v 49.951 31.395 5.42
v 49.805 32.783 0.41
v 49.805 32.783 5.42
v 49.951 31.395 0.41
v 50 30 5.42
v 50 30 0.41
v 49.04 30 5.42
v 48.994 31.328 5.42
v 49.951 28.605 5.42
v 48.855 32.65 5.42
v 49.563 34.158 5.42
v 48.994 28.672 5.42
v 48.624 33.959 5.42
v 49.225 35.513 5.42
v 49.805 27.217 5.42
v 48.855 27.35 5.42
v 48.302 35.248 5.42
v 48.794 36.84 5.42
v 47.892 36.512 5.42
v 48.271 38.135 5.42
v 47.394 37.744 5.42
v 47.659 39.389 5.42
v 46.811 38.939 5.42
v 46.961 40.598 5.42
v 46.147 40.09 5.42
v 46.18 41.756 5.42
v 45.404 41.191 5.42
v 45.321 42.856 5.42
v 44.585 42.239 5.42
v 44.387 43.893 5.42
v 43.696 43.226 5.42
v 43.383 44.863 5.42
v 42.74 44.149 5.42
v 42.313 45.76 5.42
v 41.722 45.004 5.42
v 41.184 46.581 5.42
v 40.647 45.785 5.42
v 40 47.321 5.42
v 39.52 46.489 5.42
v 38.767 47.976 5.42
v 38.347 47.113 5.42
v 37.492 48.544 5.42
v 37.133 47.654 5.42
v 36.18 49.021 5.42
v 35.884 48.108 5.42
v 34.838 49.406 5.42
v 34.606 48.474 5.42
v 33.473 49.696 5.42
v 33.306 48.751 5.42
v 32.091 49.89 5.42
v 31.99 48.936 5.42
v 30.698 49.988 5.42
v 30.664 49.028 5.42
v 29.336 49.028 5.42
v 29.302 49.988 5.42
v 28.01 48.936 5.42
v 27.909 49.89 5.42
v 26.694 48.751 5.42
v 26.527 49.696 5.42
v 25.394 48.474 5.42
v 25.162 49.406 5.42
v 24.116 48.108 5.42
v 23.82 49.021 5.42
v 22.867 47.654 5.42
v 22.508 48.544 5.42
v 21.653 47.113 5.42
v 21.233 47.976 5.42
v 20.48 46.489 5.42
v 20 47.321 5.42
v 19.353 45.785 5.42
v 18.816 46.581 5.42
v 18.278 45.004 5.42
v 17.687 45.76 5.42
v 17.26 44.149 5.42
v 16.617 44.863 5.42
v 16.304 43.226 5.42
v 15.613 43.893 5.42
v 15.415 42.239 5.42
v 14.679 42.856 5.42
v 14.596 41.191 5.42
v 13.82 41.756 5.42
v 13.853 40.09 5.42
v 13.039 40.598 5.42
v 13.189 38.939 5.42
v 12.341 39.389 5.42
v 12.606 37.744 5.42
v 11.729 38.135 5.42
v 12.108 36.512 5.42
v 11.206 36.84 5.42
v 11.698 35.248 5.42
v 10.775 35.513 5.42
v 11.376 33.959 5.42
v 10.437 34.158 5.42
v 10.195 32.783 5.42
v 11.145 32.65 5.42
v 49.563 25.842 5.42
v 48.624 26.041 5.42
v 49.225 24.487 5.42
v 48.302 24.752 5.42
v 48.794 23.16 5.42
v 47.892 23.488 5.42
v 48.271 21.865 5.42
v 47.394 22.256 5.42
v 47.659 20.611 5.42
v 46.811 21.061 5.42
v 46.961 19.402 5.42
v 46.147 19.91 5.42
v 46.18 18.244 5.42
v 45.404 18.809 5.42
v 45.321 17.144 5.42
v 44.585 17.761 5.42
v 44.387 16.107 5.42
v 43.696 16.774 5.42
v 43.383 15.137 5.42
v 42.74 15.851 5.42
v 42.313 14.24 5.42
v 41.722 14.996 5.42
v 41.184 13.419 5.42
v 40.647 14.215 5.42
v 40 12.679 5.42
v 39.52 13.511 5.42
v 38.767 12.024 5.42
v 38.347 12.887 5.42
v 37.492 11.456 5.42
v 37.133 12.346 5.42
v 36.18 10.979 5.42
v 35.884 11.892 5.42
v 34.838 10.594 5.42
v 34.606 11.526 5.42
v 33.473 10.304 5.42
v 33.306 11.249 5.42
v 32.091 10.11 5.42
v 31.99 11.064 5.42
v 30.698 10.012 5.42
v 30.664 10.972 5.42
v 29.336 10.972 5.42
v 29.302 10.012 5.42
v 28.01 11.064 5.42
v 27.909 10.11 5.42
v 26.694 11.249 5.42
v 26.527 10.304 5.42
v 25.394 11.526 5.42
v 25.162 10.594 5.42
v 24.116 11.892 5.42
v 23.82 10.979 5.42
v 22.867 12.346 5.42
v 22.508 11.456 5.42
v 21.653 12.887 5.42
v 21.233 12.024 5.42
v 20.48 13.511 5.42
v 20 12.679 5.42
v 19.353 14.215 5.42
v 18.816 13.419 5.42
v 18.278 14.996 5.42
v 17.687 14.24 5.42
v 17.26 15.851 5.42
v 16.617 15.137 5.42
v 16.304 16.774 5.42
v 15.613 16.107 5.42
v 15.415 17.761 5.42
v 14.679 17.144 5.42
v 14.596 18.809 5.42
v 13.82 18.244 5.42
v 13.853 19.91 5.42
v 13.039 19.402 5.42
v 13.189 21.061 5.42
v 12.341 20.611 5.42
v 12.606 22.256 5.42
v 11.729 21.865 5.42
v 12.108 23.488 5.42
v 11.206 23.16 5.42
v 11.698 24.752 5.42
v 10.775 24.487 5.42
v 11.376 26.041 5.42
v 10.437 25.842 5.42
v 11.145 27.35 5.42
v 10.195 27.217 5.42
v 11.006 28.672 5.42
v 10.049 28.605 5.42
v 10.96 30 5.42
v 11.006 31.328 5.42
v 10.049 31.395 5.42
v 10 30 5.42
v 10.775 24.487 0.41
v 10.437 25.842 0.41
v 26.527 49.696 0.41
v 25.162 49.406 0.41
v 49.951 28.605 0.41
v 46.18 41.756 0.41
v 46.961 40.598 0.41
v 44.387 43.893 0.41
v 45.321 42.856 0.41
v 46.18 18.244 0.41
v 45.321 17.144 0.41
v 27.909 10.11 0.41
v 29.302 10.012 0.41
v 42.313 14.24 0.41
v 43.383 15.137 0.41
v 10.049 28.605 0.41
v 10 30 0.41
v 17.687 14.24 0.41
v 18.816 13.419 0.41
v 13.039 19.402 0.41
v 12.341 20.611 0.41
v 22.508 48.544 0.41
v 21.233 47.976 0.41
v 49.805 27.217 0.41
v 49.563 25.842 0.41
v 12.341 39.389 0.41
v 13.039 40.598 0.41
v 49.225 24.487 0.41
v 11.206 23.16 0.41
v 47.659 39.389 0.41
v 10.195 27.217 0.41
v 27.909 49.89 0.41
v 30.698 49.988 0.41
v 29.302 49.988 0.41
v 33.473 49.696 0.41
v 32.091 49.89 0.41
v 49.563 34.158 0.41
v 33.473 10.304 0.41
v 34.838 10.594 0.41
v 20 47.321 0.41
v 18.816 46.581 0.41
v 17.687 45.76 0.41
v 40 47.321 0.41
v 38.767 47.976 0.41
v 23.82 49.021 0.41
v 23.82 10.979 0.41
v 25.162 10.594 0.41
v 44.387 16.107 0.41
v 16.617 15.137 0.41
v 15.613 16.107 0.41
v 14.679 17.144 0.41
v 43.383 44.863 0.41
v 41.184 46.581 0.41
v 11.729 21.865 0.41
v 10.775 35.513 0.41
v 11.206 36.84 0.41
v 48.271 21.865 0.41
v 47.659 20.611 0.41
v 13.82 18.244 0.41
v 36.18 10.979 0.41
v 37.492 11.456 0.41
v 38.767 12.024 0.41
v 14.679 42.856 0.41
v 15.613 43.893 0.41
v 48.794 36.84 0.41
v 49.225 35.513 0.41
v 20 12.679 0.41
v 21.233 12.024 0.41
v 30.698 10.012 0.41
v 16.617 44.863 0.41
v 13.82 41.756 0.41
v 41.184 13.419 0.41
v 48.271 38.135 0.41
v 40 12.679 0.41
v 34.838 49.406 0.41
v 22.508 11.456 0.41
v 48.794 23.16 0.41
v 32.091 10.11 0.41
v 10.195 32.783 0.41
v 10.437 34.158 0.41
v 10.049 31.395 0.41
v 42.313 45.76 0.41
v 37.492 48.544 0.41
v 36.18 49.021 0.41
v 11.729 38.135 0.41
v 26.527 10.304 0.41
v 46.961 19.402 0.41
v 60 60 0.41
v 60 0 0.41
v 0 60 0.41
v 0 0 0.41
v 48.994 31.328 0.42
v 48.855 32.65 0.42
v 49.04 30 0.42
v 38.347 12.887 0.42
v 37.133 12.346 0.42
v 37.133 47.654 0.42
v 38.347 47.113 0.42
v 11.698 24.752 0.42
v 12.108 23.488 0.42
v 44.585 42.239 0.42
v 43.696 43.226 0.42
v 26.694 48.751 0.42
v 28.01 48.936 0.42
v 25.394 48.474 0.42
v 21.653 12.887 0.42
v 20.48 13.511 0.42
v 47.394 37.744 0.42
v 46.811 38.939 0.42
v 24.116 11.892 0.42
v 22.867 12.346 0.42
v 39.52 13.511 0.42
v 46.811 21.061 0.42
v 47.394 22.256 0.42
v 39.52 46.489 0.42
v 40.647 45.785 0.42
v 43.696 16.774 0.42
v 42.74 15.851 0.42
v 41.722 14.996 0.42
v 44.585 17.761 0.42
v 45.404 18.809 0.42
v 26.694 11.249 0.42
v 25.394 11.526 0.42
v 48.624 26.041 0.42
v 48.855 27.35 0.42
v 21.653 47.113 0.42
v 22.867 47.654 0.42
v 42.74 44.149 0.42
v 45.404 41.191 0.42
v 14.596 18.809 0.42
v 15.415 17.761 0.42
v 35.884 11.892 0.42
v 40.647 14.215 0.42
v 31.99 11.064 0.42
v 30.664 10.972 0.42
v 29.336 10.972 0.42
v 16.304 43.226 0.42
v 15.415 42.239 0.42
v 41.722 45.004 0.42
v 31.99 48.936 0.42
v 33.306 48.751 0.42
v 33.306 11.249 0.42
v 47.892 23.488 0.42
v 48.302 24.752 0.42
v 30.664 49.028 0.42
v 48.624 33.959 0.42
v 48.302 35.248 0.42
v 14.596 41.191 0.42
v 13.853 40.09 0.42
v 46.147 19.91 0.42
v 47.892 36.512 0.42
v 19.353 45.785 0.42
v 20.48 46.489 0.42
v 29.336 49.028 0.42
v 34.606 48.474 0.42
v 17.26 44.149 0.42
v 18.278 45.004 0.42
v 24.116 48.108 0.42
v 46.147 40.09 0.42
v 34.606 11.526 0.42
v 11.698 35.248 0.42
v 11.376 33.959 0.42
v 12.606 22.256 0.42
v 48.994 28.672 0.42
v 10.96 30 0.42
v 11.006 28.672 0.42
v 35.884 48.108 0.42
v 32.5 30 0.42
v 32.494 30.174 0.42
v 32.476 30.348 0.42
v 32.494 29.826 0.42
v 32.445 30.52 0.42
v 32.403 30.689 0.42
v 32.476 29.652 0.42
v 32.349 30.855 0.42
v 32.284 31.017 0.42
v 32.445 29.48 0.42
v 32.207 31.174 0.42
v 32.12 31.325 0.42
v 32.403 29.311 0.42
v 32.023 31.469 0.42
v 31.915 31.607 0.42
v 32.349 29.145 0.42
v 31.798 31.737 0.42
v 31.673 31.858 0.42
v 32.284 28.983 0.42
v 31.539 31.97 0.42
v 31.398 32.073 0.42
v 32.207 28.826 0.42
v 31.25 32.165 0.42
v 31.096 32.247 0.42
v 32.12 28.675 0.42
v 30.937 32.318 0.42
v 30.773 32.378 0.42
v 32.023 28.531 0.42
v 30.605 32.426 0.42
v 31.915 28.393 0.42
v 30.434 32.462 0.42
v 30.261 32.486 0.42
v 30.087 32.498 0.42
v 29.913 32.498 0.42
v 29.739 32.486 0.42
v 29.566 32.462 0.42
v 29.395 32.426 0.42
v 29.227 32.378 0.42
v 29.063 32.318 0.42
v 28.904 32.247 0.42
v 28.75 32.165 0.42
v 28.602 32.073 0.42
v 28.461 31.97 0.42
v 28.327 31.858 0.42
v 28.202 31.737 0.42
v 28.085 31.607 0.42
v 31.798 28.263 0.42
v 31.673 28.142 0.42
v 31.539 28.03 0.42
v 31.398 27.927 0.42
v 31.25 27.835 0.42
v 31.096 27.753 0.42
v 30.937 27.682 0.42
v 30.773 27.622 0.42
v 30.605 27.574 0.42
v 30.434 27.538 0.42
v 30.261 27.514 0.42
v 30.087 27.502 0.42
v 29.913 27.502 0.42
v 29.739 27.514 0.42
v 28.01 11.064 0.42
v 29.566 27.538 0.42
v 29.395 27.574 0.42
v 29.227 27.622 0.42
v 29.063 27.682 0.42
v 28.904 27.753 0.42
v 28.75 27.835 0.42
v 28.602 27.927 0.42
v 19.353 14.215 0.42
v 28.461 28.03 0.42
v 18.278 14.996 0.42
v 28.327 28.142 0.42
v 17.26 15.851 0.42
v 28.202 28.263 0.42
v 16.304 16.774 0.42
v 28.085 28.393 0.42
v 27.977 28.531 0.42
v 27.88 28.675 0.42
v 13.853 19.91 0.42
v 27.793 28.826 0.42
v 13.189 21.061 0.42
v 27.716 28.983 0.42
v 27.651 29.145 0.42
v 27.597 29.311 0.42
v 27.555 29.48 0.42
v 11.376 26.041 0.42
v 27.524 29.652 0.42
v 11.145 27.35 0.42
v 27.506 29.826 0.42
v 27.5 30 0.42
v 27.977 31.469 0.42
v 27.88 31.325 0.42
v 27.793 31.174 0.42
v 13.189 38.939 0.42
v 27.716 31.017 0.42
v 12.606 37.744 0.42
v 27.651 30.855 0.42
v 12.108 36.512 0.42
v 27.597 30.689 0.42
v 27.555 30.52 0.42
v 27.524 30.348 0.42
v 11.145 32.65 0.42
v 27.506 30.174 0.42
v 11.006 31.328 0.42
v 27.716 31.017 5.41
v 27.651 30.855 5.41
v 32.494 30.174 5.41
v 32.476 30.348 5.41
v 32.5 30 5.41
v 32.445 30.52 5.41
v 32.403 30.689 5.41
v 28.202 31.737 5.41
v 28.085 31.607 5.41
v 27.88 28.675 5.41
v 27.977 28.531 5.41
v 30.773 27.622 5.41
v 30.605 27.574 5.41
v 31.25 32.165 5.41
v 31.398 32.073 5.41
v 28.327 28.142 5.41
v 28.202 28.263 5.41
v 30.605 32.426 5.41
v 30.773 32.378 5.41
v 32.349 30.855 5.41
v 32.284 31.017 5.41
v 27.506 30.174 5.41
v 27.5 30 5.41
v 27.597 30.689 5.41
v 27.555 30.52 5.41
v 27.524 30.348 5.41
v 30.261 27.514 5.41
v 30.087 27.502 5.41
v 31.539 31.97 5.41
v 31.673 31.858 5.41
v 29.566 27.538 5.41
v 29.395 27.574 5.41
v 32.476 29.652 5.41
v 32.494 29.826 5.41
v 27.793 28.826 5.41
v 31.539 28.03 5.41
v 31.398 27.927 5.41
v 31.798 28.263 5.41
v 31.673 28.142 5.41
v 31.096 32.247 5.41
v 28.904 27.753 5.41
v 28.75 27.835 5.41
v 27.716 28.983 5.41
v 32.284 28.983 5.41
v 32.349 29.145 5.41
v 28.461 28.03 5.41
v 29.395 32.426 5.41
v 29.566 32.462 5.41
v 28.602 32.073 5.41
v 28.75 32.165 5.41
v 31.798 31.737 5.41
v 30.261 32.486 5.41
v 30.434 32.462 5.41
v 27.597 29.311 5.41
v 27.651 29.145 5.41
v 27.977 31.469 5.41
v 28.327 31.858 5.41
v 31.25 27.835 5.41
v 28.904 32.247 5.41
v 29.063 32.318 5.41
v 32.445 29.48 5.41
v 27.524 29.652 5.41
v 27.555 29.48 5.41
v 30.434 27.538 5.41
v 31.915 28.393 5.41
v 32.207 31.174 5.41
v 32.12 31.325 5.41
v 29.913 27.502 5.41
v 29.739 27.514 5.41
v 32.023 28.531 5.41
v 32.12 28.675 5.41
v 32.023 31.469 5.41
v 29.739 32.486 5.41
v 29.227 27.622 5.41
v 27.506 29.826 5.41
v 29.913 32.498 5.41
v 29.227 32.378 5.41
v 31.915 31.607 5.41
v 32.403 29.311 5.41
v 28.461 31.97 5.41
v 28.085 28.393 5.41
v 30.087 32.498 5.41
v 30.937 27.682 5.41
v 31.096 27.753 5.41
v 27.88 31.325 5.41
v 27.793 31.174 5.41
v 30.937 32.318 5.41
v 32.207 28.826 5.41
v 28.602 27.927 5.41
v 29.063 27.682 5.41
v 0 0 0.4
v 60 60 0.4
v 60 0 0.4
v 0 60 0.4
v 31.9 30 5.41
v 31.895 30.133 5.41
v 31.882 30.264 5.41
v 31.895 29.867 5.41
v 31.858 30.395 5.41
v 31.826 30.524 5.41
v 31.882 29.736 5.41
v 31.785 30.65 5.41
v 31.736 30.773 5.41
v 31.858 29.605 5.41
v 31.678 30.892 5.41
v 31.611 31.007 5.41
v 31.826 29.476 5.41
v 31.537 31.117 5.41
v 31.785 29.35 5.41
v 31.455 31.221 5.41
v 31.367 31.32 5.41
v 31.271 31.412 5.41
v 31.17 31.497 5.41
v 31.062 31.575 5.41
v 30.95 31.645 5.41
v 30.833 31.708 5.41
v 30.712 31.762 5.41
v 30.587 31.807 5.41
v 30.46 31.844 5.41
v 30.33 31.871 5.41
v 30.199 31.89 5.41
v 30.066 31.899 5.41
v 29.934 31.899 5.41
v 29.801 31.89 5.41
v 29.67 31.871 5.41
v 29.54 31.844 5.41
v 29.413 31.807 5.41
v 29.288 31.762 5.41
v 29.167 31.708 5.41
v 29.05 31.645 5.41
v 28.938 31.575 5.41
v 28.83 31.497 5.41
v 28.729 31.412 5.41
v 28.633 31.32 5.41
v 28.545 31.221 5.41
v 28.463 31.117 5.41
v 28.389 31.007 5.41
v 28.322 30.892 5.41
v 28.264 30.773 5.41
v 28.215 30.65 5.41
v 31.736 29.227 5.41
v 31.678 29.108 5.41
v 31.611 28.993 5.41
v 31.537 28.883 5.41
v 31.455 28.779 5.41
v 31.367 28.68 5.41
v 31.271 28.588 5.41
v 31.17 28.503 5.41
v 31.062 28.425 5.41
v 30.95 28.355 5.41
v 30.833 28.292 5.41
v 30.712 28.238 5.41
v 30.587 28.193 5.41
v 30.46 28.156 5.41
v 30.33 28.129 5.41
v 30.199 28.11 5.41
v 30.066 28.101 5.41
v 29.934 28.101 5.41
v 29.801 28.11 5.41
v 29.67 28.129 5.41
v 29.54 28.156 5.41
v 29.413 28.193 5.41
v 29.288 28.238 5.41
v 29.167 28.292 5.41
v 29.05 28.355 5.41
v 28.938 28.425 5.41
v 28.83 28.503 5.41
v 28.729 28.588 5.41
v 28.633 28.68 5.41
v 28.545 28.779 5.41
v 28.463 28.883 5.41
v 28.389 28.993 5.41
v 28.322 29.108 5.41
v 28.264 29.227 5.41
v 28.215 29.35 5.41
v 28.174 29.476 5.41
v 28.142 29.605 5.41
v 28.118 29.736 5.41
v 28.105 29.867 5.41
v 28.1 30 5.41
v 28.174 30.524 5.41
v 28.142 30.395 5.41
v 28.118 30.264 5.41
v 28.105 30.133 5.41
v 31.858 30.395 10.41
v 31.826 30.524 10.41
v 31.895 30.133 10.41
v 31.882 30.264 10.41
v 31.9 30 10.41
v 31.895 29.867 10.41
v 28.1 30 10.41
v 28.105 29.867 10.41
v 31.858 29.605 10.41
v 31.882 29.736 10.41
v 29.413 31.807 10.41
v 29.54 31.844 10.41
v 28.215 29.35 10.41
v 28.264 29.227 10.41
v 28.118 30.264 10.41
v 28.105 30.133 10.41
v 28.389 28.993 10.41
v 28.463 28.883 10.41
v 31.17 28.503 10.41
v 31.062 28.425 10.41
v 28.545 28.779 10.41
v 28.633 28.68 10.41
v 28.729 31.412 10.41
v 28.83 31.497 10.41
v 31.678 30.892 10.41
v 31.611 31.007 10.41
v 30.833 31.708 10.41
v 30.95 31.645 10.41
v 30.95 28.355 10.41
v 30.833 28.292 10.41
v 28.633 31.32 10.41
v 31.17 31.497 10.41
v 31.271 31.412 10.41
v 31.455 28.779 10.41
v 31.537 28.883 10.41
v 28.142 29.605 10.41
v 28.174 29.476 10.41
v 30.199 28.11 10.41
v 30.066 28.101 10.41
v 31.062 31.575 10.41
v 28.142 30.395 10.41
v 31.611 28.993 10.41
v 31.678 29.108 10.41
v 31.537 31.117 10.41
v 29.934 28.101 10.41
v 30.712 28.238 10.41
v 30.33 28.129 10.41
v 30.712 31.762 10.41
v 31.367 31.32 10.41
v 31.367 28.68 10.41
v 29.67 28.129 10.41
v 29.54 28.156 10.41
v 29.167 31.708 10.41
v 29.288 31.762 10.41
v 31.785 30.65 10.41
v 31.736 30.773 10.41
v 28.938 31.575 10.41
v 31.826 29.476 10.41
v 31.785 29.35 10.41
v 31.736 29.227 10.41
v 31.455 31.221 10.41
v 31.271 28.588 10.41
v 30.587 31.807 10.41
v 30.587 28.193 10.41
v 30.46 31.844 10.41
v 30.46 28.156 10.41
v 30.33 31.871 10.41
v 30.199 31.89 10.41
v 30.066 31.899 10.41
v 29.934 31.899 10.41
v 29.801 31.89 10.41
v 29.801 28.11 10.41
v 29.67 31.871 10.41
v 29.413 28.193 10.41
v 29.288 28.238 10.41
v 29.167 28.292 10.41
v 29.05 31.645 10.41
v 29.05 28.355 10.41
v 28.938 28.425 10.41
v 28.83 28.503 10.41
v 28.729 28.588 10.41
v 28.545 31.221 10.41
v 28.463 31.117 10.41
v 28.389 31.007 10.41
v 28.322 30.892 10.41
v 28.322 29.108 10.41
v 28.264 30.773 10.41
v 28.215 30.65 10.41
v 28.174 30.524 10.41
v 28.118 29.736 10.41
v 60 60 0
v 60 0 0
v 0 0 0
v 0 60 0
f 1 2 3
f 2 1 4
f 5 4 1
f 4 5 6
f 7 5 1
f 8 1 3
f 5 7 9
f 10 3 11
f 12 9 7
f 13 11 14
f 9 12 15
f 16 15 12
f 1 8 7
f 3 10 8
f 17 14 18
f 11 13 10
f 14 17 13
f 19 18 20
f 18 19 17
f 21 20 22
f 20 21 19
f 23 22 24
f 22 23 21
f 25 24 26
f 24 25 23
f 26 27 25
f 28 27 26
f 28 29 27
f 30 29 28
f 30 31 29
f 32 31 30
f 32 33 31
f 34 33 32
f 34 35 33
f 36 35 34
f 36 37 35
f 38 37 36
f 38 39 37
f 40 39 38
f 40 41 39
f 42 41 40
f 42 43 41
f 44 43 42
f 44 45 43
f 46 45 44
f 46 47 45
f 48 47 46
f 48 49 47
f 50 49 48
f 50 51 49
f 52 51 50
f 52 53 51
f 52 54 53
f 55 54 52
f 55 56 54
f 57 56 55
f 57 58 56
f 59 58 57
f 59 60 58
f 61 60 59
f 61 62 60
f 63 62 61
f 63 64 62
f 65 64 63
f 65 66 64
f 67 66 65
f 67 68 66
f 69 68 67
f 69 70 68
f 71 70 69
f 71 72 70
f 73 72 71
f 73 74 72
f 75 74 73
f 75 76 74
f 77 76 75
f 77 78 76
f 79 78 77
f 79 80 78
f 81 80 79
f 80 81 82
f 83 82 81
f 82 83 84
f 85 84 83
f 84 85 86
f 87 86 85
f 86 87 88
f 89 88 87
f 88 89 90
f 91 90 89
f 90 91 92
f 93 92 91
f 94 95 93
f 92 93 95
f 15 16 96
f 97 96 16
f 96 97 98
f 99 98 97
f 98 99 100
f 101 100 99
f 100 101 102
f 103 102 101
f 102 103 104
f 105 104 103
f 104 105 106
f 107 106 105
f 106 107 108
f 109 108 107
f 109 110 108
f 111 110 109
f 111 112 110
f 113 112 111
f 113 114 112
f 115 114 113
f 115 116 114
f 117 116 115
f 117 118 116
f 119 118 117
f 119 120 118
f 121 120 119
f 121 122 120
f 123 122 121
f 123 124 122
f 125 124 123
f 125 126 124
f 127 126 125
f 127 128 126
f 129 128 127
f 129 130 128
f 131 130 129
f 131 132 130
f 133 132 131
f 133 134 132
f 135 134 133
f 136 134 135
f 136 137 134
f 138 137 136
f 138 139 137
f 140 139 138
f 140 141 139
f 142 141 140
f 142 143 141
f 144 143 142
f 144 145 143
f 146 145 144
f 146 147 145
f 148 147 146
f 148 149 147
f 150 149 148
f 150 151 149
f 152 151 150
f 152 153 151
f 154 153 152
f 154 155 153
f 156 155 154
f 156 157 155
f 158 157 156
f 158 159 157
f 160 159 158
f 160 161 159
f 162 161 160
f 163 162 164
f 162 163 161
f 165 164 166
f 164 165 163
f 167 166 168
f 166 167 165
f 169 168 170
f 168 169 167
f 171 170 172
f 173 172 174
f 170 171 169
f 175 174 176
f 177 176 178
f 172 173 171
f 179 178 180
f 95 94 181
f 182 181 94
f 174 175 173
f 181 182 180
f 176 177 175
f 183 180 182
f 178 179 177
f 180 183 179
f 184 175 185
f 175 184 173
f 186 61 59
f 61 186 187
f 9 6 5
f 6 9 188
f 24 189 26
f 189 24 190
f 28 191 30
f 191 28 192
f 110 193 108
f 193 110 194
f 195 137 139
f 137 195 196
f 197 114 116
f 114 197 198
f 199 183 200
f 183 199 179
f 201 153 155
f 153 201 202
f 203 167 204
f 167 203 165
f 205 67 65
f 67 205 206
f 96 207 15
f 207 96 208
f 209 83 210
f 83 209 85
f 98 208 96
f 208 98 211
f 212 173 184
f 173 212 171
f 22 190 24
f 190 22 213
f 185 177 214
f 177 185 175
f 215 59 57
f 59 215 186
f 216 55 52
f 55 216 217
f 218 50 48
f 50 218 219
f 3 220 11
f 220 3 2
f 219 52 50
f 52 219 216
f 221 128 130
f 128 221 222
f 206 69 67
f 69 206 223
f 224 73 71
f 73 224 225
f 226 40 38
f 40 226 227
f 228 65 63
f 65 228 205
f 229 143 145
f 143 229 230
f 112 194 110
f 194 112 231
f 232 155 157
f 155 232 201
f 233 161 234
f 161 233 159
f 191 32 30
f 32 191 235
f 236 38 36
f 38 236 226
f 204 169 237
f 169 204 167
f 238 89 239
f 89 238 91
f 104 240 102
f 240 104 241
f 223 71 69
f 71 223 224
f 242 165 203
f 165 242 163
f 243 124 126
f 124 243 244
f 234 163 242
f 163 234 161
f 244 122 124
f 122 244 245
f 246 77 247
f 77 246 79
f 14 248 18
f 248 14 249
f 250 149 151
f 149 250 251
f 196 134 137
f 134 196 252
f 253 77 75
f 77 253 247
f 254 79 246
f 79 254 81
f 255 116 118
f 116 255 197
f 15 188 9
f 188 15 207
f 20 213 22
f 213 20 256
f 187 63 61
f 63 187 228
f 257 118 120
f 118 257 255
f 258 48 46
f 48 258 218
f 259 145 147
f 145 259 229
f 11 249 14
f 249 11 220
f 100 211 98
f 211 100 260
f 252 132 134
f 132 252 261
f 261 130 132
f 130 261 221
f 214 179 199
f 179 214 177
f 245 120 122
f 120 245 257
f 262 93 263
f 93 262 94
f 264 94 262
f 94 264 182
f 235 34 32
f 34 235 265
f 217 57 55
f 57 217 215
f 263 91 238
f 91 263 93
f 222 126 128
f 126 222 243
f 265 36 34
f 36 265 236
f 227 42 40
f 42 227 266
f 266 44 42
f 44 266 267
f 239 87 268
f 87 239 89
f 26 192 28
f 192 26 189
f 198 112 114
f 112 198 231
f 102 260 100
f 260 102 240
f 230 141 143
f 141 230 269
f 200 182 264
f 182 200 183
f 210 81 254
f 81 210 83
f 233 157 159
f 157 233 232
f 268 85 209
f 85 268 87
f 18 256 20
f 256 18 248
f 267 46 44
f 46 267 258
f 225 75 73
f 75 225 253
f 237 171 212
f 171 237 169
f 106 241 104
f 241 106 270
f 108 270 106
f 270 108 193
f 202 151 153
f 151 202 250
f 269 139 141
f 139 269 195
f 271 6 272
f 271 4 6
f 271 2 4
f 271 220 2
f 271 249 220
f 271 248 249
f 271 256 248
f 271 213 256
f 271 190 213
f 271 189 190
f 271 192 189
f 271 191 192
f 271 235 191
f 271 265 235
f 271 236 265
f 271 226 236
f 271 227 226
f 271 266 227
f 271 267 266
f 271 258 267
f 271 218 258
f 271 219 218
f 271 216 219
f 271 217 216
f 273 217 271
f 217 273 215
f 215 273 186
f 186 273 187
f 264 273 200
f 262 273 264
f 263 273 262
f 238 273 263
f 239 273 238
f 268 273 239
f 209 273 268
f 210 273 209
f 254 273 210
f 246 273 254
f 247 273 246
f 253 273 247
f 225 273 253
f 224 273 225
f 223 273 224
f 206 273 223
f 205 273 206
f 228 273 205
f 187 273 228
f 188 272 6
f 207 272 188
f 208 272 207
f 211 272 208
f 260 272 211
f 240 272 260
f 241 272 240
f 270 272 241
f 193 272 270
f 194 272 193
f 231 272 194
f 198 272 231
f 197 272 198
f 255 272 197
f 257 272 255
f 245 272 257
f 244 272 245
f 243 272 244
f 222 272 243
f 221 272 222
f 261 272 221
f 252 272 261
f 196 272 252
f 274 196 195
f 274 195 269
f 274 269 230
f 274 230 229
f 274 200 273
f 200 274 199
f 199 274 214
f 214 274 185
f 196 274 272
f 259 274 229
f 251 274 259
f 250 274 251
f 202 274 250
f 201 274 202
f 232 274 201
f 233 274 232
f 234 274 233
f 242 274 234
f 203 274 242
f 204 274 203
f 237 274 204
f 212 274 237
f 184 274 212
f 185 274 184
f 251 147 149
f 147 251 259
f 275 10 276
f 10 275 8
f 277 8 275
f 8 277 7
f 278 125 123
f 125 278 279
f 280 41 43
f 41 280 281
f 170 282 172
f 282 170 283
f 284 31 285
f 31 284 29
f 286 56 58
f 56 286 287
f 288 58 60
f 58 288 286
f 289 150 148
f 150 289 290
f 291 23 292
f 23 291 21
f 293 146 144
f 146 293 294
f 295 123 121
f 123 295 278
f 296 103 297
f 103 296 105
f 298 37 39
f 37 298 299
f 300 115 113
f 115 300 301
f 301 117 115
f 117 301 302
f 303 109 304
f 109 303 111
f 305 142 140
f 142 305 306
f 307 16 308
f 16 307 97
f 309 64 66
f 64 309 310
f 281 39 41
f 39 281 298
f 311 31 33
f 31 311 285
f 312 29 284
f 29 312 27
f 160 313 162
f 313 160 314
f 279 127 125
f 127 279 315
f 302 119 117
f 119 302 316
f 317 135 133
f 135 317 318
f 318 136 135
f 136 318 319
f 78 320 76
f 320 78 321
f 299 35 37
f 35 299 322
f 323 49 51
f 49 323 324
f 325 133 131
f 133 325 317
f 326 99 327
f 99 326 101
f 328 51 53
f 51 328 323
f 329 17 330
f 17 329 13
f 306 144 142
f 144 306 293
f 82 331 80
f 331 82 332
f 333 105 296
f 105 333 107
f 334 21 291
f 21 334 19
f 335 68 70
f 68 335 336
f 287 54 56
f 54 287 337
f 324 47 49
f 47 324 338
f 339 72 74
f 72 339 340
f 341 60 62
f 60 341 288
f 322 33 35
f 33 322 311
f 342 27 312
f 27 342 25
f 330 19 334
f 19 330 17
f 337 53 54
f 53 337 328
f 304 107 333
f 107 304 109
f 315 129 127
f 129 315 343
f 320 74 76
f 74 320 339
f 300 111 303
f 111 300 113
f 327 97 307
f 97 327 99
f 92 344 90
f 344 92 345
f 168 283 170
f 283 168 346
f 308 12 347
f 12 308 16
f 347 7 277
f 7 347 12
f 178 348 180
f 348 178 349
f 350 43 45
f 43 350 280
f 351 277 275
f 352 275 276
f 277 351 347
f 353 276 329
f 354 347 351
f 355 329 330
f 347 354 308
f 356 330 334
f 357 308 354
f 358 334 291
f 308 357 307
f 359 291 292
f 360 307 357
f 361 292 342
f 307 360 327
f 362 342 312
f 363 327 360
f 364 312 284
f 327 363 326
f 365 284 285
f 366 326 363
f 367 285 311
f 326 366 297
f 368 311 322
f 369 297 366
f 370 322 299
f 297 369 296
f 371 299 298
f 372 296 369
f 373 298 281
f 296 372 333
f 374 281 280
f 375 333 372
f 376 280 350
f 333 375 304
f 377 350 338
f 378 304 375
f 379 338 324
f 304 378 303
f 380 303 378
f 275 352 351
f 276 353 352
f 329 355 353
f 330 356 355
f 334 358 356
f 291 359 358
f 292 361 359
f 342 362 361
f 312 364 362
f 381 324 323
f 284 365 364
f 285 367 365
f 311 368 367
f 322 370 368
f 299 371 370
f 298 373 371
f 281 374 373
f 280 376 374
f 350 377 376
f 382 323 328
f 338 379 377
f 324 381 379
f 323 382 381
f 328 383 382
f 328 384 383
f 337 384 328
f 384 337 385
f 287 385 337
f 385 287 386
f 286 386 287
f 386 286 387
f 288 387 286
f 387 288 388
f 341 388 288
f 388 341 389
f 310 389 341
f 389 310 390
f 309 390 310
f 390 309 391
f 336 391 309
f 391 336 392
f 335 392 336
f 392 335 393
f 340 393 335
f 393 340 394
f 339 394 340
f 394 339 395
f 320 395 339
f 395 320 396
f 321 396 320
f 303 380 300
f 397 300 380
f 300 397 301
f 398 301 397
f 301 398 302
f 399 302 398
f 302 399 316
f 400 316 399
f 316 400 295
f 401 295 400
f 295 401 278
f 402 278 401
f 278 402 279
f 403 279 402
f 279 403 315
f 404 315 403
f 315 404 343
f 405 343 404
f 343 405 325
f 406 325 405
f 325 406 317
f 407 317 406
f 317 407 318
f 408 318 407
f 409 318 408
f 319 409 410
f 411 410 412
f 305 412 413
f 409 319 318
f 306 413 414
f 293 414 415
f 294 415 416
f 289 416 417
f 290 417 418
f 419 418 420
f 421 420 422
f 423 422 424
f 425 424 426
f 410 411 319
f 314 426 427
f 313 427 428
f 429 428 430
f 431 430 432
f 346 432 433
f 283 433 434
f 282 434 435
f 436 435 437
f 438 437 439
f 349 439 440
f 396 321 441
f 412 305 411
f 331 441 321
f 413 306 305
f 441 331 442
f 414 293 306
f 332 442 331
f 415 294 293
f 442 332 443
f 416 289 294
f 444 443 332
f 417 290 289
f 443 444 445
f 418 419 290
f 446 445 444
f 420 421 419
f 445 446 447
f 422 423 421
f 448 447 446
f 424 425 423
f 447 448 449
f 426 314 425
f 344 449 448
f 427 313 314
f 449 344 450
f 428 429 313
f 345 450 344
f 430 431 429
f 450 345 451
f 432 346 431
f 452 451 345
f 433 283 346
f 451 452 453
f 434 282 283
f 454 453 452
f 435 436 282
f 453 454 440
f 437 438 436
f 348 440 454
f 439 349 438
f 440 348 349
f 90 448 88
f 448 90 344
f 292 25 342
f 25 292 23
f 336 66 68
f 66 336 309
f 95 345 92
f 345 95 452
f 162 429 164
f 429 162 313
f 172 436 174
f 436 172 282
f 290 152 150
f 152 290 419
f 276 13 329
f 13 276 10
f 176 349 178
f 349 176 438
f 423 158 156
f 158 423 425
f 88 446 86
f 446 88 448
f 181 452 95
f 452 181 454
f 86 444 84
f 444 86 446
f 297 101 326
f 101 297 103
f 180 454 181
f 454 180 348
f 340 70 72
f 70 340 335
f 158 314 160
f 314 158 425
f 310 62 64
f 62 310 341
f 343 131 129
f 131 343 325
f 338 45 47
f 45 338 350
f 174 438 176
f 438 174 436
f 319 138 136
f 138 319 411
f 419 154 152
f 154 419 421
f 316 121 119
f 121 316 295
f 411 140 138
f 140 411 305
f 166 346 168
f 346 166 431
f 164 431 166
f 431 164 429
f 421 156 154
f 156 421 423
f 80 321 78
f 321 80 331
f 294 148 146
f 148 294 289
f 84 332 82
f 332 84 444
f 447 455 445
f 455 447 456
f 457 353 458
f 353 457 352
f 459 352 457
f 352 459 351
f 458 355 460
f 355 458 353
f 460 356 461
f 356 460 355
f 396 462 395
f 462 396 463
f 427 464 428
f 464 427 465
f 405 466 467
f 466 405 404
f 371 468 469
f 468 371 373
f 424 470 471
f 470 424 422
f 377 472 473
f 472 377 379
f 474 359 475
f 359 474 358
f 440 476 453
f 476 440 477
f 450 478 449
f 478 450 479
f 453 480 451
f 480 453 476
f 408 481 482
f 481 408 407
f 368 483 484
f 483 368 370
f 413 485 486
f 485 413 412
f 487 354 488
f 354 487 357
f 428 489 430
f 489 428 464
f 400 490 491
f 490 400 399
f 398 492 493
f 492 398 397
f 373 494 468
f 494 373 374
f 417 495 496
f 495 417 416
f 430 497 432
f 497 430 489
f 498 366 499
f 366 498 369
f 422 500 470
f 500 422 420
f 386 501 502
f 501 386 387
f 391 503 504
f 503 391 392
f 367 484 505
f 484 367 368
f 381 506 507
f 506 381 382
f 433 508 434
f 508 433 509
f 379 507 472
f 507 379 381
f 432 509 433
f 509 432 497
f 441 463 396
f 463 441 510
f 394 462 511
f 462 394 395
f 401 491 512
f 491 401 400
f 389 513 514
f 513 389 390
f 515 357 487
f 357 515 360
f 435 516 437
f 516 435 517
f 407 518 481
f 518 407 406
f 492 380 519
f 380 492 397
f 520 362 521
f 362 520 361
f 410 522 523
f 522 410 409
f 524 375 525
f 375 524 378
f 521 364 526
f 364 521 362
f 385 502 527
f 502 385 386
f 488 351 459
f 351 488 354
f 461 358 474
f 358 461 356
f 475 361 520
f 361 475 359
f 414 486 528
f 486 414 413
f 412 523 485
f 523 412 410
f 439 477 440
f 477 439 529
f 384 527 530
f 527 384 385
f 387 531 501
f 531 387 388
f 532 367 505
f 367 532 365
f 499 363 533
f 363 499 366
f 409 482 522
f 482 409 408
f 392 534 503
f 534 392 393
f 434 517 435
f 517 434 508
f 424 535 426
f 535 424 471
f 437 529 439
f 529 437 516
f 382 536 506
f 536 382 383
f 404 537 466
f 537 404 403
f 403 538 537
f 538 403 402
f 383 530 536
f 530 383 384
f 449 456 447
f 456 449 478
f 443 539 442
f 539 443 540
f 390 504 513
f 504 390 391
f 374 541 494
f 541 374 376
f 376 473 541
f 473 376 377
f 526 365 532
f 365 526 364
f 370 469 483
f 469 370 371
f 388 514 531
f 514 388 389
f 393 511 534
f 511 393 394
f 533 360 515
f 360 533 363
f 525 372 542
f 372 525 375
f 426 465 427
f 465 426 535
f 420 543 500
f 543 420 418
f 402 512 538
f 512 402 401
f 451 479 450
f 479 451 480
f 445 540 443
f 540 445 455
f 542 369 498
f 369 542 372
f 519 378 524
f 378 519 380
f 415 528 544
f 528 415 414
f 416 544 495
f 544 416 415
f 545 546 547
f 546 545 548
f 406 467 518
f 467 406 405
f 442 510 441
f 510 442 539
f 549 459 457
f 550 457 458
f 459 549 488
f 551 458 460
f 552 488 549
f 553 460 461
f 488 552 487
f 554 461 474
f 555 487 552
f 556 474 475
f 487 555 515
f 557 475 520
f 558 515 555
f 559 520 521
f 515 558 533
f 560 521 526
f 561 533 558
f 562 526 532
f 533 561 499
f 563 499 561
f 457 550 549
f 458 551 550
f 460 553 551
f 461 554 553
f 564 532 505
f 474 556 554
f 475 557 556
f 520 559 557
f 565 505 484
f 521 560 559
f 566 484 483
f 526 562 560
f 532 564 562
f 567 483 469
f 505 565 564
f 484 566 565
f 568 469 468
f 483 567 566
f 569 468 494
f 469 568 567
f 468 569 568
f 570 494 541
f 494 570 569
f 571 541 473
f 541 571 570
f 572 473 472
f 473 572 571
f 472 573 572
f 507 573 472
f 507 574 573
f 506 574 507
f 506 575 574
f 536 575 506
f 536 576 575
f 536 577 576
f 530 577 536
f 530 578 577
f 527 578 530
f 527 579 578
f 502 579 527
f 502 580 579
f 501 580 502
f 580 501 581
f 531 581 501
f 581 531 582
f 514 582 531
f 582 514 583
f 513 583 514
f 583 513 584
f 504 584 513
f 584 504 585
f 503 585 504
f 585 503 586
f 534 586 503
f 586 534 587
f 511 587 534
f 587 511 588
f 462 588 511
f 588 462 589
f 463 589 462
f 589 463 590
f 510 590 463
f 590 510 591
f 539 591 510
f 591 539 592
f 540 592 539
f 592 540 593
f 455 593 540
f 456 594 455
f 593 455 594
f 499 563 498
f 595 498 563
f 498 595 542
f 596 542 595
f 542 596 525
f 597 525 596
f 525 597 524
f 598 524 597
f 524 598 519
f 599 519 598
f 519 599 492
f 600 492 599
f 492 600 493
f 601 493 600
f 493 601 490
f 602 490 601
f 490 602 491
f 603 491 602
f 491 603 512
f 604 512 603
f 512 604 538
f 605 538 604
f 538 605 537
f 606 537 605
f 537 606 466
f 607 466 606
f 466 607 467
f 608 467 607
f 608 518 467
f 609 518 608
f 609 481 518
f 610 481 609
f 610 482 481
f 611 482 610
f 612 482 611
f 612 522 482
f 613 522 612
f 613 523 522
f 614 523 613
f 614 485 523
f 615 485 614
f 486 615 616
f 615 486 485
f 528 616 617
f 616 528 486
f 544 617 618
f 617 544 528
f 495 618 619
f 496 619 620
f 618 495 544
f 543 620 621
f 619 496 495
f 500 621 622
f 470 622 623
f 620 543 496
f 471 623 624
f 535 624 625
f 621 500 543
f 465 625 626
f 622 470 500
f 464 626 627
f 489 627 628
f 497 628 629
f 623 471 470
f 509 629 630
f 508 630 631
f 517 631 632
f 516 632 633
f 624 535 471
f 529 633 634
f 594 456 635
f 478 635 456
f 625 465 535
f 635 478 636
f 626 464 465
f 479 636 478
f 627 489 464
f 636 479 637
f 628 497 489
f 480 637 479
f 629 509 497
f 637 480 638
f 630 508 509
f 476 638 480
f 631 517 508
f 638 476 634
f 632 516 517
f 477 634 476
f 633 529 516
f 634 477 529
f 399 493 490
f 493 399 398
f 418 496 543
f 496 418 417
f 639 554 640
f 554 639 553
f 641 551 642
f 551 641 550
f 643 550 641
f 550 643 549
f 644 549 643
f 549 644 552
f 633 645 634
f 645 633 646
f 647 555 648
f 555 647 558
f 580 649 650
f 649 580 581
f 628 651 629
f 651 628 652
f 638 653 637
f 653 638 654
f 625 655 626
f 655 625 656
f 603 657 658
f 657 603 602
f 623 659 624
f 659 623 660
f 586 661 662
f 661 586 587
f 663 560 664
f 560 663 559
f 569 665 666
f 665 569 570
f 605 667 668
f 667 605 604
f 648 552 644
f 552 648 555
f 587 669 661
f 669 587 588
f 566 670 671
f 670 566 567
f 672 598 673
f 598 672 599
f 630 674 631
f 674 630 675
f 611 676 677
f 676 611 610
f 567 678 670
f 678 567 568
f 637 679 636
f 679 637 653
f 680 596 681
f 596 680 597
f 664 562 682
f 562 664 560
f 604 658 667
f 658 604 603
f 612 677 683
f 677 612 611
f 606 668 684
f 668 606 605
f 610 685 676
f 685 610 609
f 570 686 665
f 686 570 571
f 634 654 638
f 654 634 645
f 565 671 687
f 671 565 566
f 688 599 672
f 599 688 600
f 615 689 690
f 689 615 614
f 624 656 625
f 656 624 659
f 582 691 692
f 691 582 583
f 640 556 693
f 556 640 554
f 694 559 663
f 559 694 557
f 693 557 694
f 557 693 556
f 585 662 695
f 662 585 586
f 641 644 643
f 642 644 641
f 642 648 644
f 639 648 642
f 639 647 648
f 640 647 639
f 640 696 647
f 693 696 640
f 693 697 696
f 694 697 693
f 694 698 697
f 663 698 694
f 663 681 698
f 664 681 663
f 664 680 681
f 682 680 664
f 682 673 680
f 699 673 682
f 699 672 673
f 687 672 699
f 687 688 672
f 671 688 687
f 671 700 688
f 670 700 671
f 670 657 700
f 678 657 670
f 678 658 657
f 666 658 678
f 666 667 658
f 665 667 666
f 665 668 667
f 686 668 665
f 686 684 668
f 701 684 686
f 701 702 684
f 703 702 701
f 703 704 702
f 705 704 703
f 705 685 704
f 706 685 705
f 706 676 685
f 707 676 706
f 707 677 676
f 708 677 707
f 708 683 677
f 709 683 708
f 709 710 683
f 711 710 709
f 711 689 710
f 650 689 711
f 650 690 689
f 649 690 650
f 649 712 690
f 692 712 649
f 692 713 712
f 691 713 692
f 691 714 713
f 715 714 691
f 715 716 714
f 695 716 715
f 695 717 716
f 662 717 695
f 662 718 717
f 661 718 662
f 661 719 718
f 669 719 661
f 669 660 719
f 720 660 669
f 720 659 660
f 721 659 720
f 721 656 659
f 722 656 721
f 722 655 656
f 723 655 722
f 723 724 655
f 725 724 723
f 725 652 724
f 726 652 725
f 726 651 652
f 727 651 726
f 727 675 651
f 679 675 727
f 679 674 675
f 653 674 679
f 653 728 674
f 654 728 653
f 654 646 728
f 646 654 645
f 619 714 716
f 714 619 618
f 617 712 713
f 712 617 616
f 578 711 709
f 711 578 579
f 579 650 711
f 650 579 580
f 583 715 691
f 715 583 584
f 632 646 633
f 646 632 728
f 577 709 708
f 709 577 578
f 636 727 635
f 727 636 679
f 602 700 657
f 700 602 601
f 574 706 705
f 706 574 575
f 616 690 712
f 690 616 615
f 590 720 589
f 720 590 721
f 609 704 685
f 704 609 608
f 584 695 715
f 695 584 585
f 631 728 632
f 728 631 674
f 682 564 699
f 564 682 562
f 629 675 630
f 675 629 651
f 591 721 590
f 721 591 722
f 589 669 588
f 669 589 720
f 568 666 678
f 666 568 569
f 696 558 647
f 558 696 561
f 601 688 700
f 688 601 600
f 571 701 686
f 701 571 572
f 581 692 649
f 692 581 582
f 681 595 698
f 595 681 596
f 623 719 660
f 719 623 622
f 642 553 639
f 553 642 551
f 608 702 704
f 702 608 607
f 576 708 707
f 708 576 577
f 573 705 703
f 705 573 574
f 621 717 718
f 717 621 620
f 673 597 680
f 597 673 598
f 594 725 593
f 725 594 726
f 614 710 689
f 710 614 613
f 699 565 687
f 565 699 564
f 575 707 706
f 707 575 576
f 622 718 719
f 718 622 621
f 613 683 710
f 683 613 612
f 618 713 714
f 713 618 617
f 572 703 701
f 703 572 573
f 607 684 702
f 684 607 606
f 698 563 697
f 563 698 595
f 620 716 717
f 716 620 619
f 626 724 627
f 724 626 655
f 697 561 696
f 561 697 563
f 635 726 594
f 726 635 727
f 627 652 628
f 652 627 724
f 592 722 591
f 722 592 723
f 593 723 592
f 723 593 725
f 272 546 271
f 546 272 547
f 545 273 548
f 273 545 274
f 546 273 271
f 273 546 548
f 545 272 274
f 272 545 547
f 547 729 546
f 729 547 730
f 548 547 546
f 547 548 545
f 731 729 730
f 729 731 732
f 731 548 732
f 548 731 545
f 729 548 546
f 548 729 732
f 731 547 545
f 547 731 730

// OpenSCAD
// file: ../../Base/PlacementOptions.scad
// Fischertechnik Box Foundation
// Placement Options

// Alignment
NoAlign = 0;
AlignLeft = 1;
AlignBottom = 2;
AlignCenter = 3;
AlignRight = 4;
AlignTop = 5;

// Element rotation degree steps
rotations = [0, -90, -180, -270];

// Rotation
NoRotation = 0;
Rotate0 = 0;
Rotate90 = 1;
Rotate180 = 2;
Rotate270 = 3;

// Docking (seen from above)
NoDock = -1;
DockLeft = 0;
DockTop = 1;
DockRight = 2;
DockCorner = 2;
DockBottom = 3;

// Web corners
LowerLeft = 0;
UpperLeft = 1;
UpperRight = 2;
LowerRight = 3;

// Web position relative to corner
LeftOfCorner = 0;
RightOfCorner = 1;
// file: ../../Base/Boxes.scad
// Fischertechnik Box Foundation
// Pre-designed Boxes

use <Constants.scad>

include <PlacementOptions.scad>

box190Width = 190;
box190Depth = 130;
box130Width = 130;
box130Depth = 95;

// Values are from an original ec3 box
topBottomDifference = 1.5;
outerHeight = 40;
innerHeight = 38.2;
baseThickness = outerHeight - innerHeight;
stackExcess = 5.7;
radius = 3.5;
wallThickness = 1.5;
tolerance = 0.2;
stackOffset = innerHeight - stackExcess;

boxUsageHeight = stackOffset;
boxWallThickness = wallThickness;
boxBaseThickness = baseThickness;
boxWebWidth = 3.0;

// getBoxWallThickness()
// Gets the wall thickness of a Fischertechnik Box
function getBoxWallThickness() = boxWallThickness;

// getBoxUsageHeight()
// Gets the usable height of a Fischertechnik box
function getBoxUsageHeight() = boxUsageHeight;

// getBoxInnerHeight()
// Gets the inner height of a Fischertechnik box, including the stack excess
function getBoxInnerHeight() = innerHeight;

// getBoxBaseThickness()
// Gets the thickness of the Fischertechnik box base.
function getBoxBaseThickness() = boxBaseThickness;

// getBoxWebWidth()
// Gets the width of a box web
function getBoxWebWidth() = boxWebWidth;

// getBox190Space()
// Gets the usable inner space of a Box 190 as an x/y-list
function getBox190Space() = [
    box190Width - 2*getBoxWallThickness() - topBottomDifference, 
    box190Depth - 2*getBoxWallThickness() - topBottomDifference ];

// BoxBase(width, depth)
// Creates an empty stackable Fischertechnik compatible box
// width = Outer width of the box (190, 130, ...)
// depth = Outer depth of the box (130, 95, ...)

module BoxBase(width, depth, height=outerHeight) {    
    thinPlate = 0.01;

    innerHeight = height - baseThickness;    
    
    module BodyPlate(width, depth) {
        translate([radius, radius])
        hull() {
            w = width-2*radius;
            d = depth-2*radius;
            cube([w, d, thinPlate]);
            cylinder(thinPlate, r=radius, $fn=getFragments());
            translate([w, 0])
                cylinder(thinPlate, r=radius, $fn=getFragments());
            translate([w, d])
                cylinder(thinPlate, r=radius, $fn=getFragments());
            translate([0, d])
                cylinder(thinPlate, r=radius, $fn=getFragments());
        }
    }
    
    module Body(tolerance=tolerance) {
        hull() {
            // Bottom with tolerance to fit into the original boxes when stacked
            translate([-wallThickness+tolerance, -wallThickness+tolerance, -baseThickness])
                BodyPlate(width-topBottomDifference-2*tolerance, depth-topBottomDifference-2*tolerance);
            
            // Top
            translate([-wallThickness-topBottomDifference/2, -wallThickness-topBottomDifference/2, innerHeight-thinPlate])
                BodyPlate(width, depth);
         }
    }

    module Cutoff() {
        hull() {
            coWidth = width - 2*wallThickness;
            coDepth = depth - 2*wallThickness;
            
            // Bottom
            BodyPlate(coWidth-topBottomDifference, coDepth-topBottomDifference);

            // Top
            translate([-topBottomDifference/2, -topBottomDifference/2, innerHeight+thinPlate]) 
                BodyPlate(coWidth, coDepth);
        }
    }
    
    difference() {        
        Body();
        Cutoff();
        stackOffset = innerHeight - stackExcess;
        translate([0, 0, stackOffset + baseThickness])
            Body(tolerance=0);
    }
}

// Creates the Fischertechnik empty box 130x190 mm and places it at position 0,0
// 190x130 are the outer sizes, the inner space is slightly smaller. Use getBox190Space() to get the inner sizes.
// The box is positioned that the usable inner space is at the 0,0,0 position. The

module Box190() {
    BoxBase(box190Width, box190Depth);
}

// Gets the usable inner space of a Box 130 as an x/y-list
function getBox130Space() = [
    box130Width - 2*getBoxWallThickness() - topBottomDifference, 
    box130Depth - 2*getBoxWallThickness() - topBottomDifference ];

// Creates the Fischertechnik empty box 95x130 mm and places it at position 0,0
// 190x130 are the outer sizes, the inner space is slightly smaller. Use getBox190Space() to get the inner sizes.
// The box is positioned that the usable inner space is at the 0,0,0 position. The

module Box130() {
    BoxBase(box130Width, box130Depth);
}

// Creates a web at the specified box walls
// corner 0 = LowerLeft, 1 = UpperLeft, 2 = UpperRight, 3 = LowerRight
// side 0 = LeftOfCorner, 1 = RightOfCorner
// distance = Distance in mm from the corner
// boxSpace = inner width and depth of the box (default: Box 190)
// webWidth = length of the web (default is 3 mms)
// webThickness = thickness of the web (default is 1 mm)

module BoxWeb(corner, side, distance, boxSpace=getBox190Space(), webWidth=getBoxWebWidth(), webThickness=1.0) {
    sink = getBoxWallThickness()/2;

    width = (corner % 2 == 0) ? 
            (side == LeftOfCorner ? webWidth : webThickness) :
            (side == LeftOfCorner ? webThickness : webWidth);

    depth = (corner % 2 == 0) ? 
            (side == RightOfCorner ? webWidth : webThickness) :
            (side == RightOfCorner ? webThickness : webWidth);
    
    xDiff = corner == LowerLeft ? 
                (side == LeftOfCorner ? -sink : distance) :
            (corner == UpperLeft ?                
                (side == LeftOfCorner ? distance : -sink) :
            (corner == UpperRight ?
                (side == LeftOfCorner ? boxSpace.x-webWidth+sink : boxSpace.x-distance-webThickness) :
                (side == LeftOfCorner ? boxSpace.x-distance-webThickness: boxSpace.x-webWidth+sink)));

    yDiff = corner == LowerLeft ? 
                (side == RightOfCorner ? -sink : distance) :
            (corner == UpperLeft ?
                (side == RightOfCorner ? boxSpace.y-distance : boxSpace.y-webWidth+sink) :
            (corner == UpperRight ?
                (side == RightOfCorner ? boxSpace.y-webWidth+sink : boxSpace.y-distance) :
                (side == RightOfCorner ? distance : -sink)));
    
    translate([xDiff, yDiff, -getExcess()])
        cube([width, depth, boxUsageHeight + 2*getExcess()]);
}
// file: ../../Base/Rotation.scad
// Fischertechnik Box Foundation
// Geometry Helpers Rotation

include <PlacementOptions.scad>

// getRotatedSpace(space, rotation=NoRotation)
// Rotates the space dependent on the specified rotation

function getRotatedSpace(space, rotation=NoRotation) = [
    (rotation == Rotate90 || rotation == Rotate270) ? space.y : space.x,
    (rotation == Rotate90 || rotation == Rotate270) ? space.x : space.y
];

// Rotates the given space around the fixed left lower corner
// space = the space the children needs as width/depth list [width,depth]
// rotation = 0 Rotate0 degrees, 1 Rotate90 degrees, 2 Rotate180 degrees, 3 Rotate270 degrees (equivalent to -90)

module RotateFix(space, rotation=NoRotation) {
    dy = (rotation == Rotate0 || rotation == Rotate270) ? 0 :
        (rotation == Rotate90) ? space.x :
        space.y;
    dx = (rotation < Rotate180) ? 0 :
        (rotation == Rotate180) ? space.x :
        space.y;
    
    translate([dx, dy, 0])
        rotate([0, 0, rotations[rotation]])
            children();
}
// file: ../../Base/Alignment.scad
// Fischertechnik Box Foundation
// Geometry Helpers Alignment

include <PlacementOptions.scad>

// getAlignedX(elementWidth, spaceWidth, align=AlignRight, offset=0)
// Gets the aligned X offset of an element with the given
// width in the given space.
// elementWidth = The width of the element to positon
// spaceWidth = The space where the element should be aligned
// align = 0 AlignLeft, 1 AlignCenter, 2 AlignRight
// offset = an optional offset from the aligned position. When
// aligned left or centered, then positive values are in X direction.
// When aligned right then positive values are in negative X direction.

function getAlignedX(elementWidth, spaceWidth, align=AlignRight, offset=0) =
    (align == AlignLeft) ?
        offset :
        ((align == AlignCenter) ?
        (spaceWidth - elementWidth)/2 + offset :
        spaceWidth - offset - elementWidth);

// getAlignedY(elementDepth, spaceDepth, align=AlignTop, offset=0)
// Gets the aligned Y offset of an element with the given
// depth in the given space.
// elementDepth = The depth of the element to positon
// spaceDepth = The space where the element should be aligned
// align = 0 AlignBottom, 1 AlignCenter, 2 AlignTop
// offset = an optional offset from the aligned position. When
// aligned bottom or centered, then positive values are in Y direction.
// When aligned top then positive values are in negative Y direction.

function getAlignedY(elementDepth, spaceDepth, align=AlignTop, offset=0) =
    (align == AlignBottom) ?
        offset :
        ((align == AlignCenter) ?
        (spaceDepth - elementDepth)/2 + offset :
        spaceDepth - offset - elementDepth);
// file: ../../Base/Placement.scad
// Fischertechnik Box Foundation
// Geometry Helpers Placement

use <Constants.scad>
use <Alignment.scad>
use <Rotation.scad>
use <Boxes.scad>

include <PlacementOptions.scad>

// Place(x=0, y=0, elementSpace=[0,0], alignX=AlignLeft, alignY=AlignBottom, rotation=Rotate0, boxSpace=getBox190Space())
// Places the child at the specified position
// y = Y-Position. This is a relative position when an X aligment is specified.
// x = X-Position. This is a relative position when an Y aligment is specified.
// elementSpace = space of the element to be placed [x,y]
// alignX = -1=NoAlign, 0 AlignLeft, 1 AlignCenter, 3 AlignRight (elementSpace and boxSpace required!)
// alignY = -1=NoAlign, 2 AlignBottom, 1 AlignCenter, 4 AlignTop (elementSpace and boxSpace required!)
// rotation = 0 Rotate0 0 degrees, 1 Rotate90 90 degrees, 
// 2 Rotate180 180 degrees, 3 Rotate270 270 degrees (equivalent to -90)
// boxSpace = Inner space of the box where the placement occurs [x,y] - default is Box 190x130 inner space

module Place(x=0, y=0, elementSpace=[0,0], 
  alignX=AlignLeft, alignY=AlignBottom, 
  rotation=NoRotation, boxSpace=getBox190Space()) {

    module Position(x, y, space, rotation=Rotate0) {
        translate([x, y, 0])
            RotateFix(space, rotation)
                children();
    }

    space = getRotatedSpace(elementSpace, rotation);
    alignedX = getAlignedX(space.x, boxSpace.x, alignX, x);
    alignedY = getAlignedY(space.y, boxSpace.y, alignY, y);
    Position(alignedX, alignedY, elementSpace, rotation)
        children();
}

// Center(space=getBox130Space(), elementSpace=[0,0])
// space = Space where the children is centered. For cylinder use centered=true and no elementSpace.
// elementSpace = space of the element to be centered [x,y]

module Center(space=getBox190Space(), elementSpace=[0,0]) {
    Place(elementSpace=elementSpace, boxSpace=space, alignX=AlignCenter, alignY=AlignCenter)
        children();
}

// CenterHorizontal(width=0, y=0, offset=0, space=getBox130Space())
// width = Width of the element to be placed.
// y = Y position of the element
// offset = Offset from the center position (negative will be left of the center)
// space = Space where the element is placed

module CenterHorizontal(width=0, y=0, offset=0, space=getBox190Space()) {
    Place(x=offset, y=y, elementSpace=[width, 0], boxSpace=space, alignX=AlignCenter)
        children(0);
}

// CenterVertical(depth=0, x=0, offset=0, space=getBox130Space())
// depth = Depth of the element to be placed.
// x = X position of the element
// offset = Offset from the center position (negative will be down of the center)
// space = Space where the element is placed

module CenterVertical(depth=0, x=0, offset=0, space=getBox190Space()) {
    Place(x=x, y=offset, elementSpace=[0, depth], boxSpace=space, alignY=AlignCenter)
        children(0);
}

// getIsVertical(align)
// True if the specified alignment needs a vertical orientation for a divider (AlignRight, AlignLeft)

function getIsVertical(align) = (align == AlignRight || align == AlignLeft);

// getIsHorizontal(align)
// True if the specified alignment needs a horizontal orientation for a divider (AlignTop, AlignBottom)

function getIsHorizontal(align) = (align == AlignTop || align == AlignBottom);
// file: ../../Elements/AxisClip10.scad
// Fischertechnik Box Library
// Axis for clip 10
// 31023

use <../ModelBase/Simple.scad>
use <../Base/Constants.scad>

/* [Element Parameters] */
height = 23;
clipHeight = 10;

/* [Hidden] */
width = 12;
depth = 12;
upperDiameter = 3.6;

// getAxisClip10Space()
// Gets the space of a frame for a clip 10 with spring ring (mot2)

function getAxisClip10Space() = [width, depth, height];

// AxisClip10(height, clipHeight)
// Axis for clip 10 with spring ring (mot2)
// height = Height of the complete axis (standard is 23, in mot3 its only 12)
// clipHeight = Height of the part for the clip (standard is 10, in mot3 its only 7)

module AxisClip10(height=height, clipHeight=clipHeight) {
    LeveledAxisWithSpace(height, height-clipHeight, getAxisClip10Space(), diameter=upperDiameter);
}

// Test
color("lightgray")
AxisClip10(height, clipHeight);
// file: ../../Base/Constants.scad
// Fischertechnik Box Foundation
// Constants

// Constant values necessary for multiple elements

// Base constants
dividerThickness = 1.2;
excess = 0.01;
fragments = 90;
tolerance = 0.8;

// Gets the thickness of a divider 
function getDividerThickness() = dividerThickness;

// Gets the excess that is used to merge walls into each other
function getExcess() = excess;

// Gets amount of fragments of a cylinder
function getFragments() = fragments;

// Gets the inner tolerance of a frame to each side
function getTolerance() = tolerance;


// Fischertechnik specific constants
axisDiameter = 4;
axisBottomDiameter = axisDiameter + 1;
axisTolerance = 0.2;

// Gets axis diameter of Fischertechnik axis
function getAxisDiameter() = axisDiameter;

// Gets axis diameter tolerance (subtracted for element axis)
function getAxisTolerance() = axisTolerance;

// Gets the axis diameter for standing axis
function getStandAxisDiameter() = getAxisDiameter() - getAxisTolerance();

// Gets axis bottom diameter for thicker part at the bottom
function getAxisBottomDiameter() = axisBottomDiameter;

standardEdgeDistance = 2.5;
standardWebDistance = 11.5;
standardCornerLength = 15;

// gets the standard distance to the wall of the box for dockable frames with webs
function getStandardEdgeDistance() = standardEdgeDistance;

// gets the standard distance of each web to the corner of the dockable frame
function getStandardWebDistance() = standardWebDistance;

// gets the standard length of the corner walls of a dockable frame
function getStandardCornerLength() = standardCornerLength;

tubeWallFactor = 0.8;

// gets the wall thickness of a tube.
function getTubeWallThickness() = tubeWallFactor * getDividerThickness();

smallPartsFrameHeight = 20;

// gets the frame height for docked small parts boxes.
function getSmallPartsFrameHeight() = smallPartsFrameHeight;

hubRingDiameter = 19.5;
hubRingLevelDiameter = 21;

// gets the diameter of a tube matching the inner ring of a wheel
function getHubRingDiameter() = hubRingDiameter;

// gets the diameter of a hub tube with a thicker diameter
function getHubRingLevelDiameter() = hubRingLevelDiameter;
// file: ../../Elements/ComboFlatHubLargePulleyWheel.scad
// Fischertechnik Box Library
// Axis and cylinder for large pulley wheel with flat hub
// 31019, 31015

use <../Base/Constants.scad>
use <../Base/Placement.scad>
use <../ModelBase/Simple.scad>

/* [Element Parameters] */
height = 10;

/* [Hidden] */
width = 60;
depth = 60;
wheelThickness = 5;

// getComboFlatHubLargePulleyWheelSpace
// Gets the space the cylinder for the large pulley wheel needs.

function getComboFlatHubLargePulleyWheelSpace() = [width, depth, height];

// ComboFlatHubLargePulleyWheel
// Two cylinders for the large pulley wheel
// height = Height of the axis (the ring will be 5 mm lower)

module ComboFlatHubLargePulleyWheel(height=height) {
    Space(getComboFlatHubLargePulleyWheelSpace());

    ringDiameter = 40;
    levelHeight = height - wheelThickness;

    Center(getComboFlatHubLargePulleyWheelSpace()) {
        Tube(levelHeight, outerDiameter=ringDiameter);
        LeveledAxis(height, levelHeight);
    }
}

// Test
color("lightgray")
ComboFlatHubLargePulleyWheel(height);
// file: ../TestPrint.scad
// 3D Print Test Base

use <../Base/Constants.scad>

use <../Elements/AxisClip10.scad>

module TestPrint(elementSpace) {
    cube([elementSpace.x, elementSpace.y, 0.4]);
    translate([0,0,0.4+getExcess()]) {
        children();
    }
}

TestPrint(getAxisClip10Space())
    AxisClip10();
// main file
// 3D Print Test
// ComboFlatHubLargePulleyWheel

use <../TestPrint.scad>
use <../../Elements/ComboFlatHubLargePulleyWheel.scad>

height = 10;

TestPrint(getComboFlatHubLargePulleyWheelSpace())
    ComboFlatHubLargePulleyWheel(height);
